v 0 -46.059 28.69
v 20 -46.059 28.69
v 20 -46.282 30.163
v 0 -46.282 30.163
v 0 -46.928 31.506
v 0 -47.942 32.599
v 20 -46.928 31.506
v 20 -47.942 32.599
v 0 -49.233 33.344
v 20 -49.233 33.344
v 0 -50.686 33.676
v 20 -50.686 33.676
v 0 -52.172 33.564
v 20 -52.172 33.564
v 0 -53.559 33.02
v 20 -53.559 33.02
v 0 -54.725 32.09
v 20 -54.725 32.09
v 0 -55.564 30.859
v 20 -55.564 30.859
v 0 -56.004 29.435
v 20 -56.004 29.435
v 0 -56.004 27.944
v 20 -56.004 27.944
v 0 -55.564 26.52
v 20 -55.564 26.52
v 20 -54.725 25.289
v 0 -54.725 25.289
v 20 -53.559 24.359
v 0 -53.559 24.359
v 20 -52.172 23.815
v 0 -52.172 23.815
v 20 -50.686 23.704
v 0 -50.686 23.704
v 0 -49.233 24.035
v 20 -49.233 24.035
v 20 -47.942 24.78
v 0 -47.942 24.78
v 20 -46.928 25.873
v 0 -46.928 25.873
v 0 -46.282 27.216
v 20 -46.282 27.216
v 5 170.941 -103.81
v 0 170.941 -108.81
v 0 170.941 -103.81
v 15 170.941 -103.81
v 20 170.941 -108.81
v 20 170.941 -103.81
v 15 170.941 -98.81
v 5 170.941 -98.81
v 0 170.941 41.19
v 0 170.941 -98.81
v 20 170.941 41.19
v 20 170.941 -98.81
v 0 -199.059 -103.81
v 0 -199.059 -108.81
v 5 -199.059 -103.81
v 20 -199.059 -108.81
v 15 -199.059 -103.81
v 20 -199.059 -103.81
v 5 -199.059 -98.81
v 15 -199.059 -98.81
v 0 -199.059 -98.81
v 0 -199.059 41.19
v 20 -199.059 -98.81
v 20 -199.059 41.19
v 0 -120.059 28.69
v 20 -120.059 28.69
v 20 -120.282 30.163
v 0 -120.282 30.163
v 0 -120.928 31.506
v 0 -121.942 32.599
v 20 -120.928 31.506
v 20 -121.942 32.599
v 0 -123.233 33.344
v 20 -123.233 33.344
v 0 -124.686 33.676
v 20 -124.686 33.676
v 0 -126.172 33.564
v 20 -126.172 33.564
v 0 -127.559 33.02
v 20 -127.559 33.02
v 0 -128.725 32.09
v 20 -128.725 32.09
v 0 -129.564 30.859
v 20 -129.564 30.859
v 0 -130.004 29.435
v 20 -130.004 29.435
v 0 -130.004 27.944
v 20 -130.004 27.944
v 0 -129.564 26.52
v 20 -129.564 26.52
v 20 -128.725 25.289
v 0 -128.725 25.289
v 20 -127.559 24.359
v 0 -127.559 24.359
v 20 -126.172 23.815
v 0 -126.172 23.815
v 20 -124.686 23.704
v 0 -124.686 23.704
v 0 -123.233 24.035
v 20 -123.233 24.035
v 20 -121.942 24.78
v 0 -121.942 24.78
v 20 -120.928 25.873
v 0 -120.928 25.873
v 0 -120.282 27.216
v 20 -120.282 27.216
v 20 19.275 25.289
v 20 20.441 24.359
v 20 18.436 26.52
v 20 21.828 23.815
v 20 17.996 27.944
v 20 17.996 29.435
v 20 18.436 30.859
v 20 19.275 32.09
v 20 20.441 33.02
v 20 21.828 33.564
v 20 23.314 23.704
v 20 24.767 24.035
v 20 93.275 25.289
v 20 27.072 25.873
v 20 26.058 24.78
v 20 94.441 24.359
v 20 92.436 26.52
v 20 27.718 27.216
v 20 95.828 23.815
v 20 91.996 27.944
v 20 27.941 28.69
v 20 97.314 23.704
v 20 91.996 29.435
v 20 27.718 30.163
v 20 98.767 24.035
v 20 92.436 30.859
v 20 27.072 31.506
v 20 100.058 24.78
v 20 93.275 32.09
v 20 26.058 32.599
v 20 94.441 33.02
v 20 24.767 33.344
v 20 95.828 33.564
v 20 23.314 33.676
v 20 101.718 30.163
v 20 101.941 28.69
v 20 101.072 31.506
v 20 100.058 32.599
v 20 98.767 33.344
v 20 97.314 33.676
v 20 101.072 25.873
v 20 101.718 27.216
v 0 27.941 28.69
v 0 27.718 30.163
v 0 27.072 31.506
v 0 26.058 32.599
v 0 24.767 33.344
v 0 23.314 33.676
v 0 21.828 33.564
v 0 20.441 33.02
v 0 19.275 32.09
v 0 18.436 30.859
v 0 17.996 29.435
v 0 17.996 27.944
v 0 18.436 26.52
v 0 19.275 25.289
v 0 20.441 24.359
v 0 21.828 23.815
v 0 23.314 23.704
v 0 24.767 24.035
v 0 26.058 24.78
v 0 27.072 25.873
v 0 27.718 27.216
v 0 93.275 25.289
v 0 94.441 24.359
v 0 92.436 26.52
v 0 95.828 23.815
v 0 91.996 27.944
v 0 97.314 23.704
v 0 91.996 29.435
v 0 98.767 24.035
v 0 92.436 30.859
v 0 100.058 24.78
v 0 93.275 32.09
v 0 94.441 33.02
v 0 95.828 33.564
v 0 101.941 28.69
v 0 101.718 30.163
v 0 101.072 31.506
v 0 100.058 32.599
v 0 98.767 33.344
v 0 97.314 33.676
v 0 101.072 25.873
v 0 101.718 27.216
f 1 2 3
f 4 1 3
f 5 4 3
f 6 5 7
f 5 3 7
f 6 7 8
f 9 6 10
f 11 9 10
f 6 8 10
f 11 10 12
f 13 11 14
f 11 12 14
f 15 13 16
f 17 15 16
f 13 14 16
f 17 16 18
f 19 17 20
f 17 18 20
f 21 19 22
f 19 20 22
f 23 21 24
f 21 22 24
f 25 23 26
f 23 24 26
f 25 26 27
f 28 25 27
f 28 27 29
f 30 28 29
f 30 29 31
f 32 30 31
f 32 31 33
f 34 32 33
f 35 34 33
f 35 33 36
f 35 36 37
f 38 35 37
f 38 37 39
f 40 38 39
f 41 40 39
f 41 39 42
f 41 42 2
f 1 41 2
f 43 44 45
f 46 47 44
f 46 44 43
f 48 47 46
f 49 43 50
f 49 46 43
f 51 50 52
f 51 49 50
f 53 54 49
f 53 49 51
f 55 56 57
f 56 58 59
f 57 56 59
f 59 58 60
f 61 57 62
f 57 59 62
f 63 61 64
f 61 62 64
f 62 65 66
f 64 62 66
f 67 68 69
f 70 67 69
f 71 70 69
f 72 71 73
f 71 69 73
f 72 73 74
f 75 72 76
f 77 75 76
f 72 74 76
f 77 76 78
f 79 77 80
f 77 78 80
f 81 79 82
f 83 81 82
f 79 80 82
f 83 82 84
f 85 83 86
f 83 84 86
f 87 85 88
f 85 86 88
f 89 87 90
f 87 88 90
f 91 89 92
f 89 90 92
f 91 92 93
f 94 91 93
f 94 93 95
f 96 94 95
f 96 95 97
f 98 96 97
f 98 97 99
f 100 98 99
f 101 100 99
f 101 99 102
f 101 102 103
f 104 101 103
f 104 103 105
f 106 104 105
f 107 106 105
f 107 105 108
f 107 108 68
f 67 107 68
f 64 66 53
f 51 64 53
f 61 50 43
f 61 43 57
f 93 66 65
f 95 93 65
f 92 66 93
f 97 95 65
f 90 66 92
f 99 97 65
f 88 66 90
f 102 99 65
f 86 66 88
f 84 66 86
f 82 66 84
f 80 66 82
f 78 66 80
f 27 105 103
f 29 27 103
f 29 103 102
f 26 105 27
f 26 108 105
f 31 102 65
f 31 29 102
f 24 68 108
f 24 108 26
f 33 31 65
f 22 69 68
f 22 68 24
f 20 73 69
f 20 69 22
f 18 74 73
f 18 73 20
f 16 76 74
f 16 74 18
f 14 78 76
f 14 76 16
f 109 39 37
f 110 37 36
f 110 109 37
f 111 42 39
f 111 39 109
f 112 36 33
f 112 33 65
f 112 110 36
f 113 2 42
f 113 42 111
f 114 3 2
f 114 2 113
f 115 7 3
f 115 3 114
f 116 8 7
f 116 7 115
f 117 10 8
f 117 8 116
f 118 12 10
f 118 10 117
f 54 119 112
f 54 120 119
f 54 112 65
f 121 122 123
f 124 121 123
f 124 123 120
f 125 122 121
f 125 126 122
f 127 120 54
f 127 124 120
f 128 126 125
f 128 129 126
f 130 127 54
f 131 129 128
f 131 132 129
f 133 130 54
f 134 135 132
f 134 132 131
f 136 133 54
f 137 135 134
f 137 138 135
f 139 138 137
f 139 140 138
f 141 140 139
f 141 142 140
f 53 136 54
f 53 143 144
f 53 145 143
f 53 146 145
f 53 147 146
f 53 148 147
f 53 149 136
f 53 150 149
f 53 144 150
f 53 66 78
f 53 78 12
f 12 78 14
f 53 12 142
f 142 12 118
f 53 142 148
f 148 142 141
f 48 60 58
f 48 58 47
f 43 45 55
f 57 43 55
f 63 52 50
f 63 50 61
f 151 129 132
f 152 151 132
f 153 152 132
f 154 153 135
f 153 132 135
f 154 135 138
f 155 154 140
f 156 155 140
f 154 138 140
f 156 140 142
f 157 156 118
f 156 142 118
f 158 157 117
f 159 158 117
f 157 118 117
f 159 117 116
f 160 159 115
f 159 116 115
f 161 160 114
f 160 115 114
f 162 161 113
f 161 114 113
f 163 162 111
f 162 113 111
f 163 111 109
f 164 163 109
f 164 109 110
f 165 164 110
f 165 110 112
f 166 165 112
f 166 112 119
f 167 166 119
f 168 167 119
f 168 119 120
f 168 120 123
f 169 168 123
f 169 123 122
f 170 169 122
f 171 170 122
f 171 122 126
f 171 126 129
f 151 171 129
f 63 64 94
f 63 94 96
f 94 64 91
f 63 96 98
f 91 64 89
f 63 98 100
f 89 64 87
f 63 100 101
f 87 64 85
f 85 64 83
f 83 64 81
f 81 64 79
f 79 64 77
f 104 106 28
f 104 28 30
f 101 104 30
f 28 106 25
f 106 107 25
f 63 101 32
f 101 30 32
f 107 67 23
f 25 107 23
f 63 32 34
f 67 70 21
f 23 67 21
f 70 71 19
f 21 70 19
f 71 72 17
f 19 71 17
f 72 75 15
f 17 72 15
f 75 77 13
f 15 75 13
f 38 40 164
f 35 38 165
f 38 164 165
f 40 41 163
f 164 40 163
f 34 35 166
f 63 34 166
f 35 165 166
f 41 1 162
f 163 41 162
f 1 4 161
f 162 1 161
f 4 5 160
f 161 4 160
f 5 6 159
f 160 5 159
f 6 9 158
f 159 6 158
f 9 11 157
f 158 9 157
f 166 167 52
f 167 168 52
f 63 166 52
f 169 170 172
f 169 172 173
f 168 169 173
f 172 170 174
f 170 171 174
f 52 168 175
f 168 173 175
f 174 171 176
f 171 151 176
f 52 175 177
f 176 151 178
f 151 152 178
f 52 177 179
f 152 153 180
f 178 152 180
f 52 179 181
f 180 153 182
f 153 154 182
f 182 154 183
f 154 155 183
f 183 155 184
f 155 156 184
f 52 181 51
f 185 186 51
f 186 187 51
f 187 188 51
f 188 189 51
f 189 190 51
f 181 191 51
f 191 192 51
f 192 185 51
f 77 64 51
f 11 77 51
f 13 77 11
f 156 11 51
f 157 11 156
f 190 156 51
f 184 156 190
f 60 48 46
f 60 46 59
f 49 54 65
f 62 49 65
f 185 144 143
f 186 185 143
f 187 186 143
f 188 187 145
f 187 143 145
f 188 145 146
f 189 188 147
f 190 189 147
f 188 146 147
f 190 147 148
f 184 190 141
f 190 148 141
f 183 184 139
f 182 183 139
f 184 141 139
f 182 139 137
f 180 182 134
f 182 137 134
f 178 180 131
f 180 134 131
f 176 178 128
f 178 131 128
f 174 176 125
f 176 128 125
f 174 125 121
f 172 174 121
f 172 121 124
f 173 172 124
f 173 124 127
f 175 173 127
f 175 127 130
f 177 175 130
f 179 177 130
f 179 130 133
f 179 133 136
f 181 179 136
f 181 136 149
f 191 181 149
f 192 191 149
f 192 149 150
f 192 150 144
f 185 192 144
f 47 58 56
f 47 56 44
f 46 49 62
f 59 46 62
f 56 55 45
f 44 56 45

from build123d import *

# Parameters (mm, degrees)
F0_W     = 370
F0_H     = 150
F0_R     = 5
F1_DEPTH = 10
F2_W     = 370
F2_H     = 5
F3_DEPTH = 5


with BuildPart() as f1:
    # F0 (on Right) → F1 (new body)
    with BuildSketch(Plane.YZ):
        with Locations((-14.059471, -33.810468)):
            Rectangle(F0_W, F0_H)
        with Locations((-125.059471, 28.689532)):
            Circle(F0_R, mode=Mode.SUBTRACT)
        with Locations((-51.059471, 28.689532)):
            Circle(F0_R, mode=Mode.SUBTRACT)
        with Locations((22.940529, 28.689532)):
            Circle(F0_R, mode=Mode.SUBTRACT)
        with Locations((96.940529, 28.689532)):
            Circle(F0_R, mode=Mode.SUBTRACT)
    extrude(amount=F1_DEPTH)

    # F2 (on face) → F3 (cut)
    with BuildSketch(Plane(origin=(0, 0, 0), x_dir=(0, -1, 0), z_dir=(-1, 0, 0))):
        with Locations((14.059471, -101.310468)):
            Rectangle(F2_W, F2_H)
    extrude(amount=-F3_DEPTH, mode=Mode.SUBTRACT)

    # F4: F1 across face


with BuildPart() as f1_1:
    add(f1.part)
    add(f1.part.mirror(Plane(origin=(10, -14.059471, -34.166265), x_dir=(0, 1, 0), z_dir=(1, 0, 0))))


solid = f1_1.part
